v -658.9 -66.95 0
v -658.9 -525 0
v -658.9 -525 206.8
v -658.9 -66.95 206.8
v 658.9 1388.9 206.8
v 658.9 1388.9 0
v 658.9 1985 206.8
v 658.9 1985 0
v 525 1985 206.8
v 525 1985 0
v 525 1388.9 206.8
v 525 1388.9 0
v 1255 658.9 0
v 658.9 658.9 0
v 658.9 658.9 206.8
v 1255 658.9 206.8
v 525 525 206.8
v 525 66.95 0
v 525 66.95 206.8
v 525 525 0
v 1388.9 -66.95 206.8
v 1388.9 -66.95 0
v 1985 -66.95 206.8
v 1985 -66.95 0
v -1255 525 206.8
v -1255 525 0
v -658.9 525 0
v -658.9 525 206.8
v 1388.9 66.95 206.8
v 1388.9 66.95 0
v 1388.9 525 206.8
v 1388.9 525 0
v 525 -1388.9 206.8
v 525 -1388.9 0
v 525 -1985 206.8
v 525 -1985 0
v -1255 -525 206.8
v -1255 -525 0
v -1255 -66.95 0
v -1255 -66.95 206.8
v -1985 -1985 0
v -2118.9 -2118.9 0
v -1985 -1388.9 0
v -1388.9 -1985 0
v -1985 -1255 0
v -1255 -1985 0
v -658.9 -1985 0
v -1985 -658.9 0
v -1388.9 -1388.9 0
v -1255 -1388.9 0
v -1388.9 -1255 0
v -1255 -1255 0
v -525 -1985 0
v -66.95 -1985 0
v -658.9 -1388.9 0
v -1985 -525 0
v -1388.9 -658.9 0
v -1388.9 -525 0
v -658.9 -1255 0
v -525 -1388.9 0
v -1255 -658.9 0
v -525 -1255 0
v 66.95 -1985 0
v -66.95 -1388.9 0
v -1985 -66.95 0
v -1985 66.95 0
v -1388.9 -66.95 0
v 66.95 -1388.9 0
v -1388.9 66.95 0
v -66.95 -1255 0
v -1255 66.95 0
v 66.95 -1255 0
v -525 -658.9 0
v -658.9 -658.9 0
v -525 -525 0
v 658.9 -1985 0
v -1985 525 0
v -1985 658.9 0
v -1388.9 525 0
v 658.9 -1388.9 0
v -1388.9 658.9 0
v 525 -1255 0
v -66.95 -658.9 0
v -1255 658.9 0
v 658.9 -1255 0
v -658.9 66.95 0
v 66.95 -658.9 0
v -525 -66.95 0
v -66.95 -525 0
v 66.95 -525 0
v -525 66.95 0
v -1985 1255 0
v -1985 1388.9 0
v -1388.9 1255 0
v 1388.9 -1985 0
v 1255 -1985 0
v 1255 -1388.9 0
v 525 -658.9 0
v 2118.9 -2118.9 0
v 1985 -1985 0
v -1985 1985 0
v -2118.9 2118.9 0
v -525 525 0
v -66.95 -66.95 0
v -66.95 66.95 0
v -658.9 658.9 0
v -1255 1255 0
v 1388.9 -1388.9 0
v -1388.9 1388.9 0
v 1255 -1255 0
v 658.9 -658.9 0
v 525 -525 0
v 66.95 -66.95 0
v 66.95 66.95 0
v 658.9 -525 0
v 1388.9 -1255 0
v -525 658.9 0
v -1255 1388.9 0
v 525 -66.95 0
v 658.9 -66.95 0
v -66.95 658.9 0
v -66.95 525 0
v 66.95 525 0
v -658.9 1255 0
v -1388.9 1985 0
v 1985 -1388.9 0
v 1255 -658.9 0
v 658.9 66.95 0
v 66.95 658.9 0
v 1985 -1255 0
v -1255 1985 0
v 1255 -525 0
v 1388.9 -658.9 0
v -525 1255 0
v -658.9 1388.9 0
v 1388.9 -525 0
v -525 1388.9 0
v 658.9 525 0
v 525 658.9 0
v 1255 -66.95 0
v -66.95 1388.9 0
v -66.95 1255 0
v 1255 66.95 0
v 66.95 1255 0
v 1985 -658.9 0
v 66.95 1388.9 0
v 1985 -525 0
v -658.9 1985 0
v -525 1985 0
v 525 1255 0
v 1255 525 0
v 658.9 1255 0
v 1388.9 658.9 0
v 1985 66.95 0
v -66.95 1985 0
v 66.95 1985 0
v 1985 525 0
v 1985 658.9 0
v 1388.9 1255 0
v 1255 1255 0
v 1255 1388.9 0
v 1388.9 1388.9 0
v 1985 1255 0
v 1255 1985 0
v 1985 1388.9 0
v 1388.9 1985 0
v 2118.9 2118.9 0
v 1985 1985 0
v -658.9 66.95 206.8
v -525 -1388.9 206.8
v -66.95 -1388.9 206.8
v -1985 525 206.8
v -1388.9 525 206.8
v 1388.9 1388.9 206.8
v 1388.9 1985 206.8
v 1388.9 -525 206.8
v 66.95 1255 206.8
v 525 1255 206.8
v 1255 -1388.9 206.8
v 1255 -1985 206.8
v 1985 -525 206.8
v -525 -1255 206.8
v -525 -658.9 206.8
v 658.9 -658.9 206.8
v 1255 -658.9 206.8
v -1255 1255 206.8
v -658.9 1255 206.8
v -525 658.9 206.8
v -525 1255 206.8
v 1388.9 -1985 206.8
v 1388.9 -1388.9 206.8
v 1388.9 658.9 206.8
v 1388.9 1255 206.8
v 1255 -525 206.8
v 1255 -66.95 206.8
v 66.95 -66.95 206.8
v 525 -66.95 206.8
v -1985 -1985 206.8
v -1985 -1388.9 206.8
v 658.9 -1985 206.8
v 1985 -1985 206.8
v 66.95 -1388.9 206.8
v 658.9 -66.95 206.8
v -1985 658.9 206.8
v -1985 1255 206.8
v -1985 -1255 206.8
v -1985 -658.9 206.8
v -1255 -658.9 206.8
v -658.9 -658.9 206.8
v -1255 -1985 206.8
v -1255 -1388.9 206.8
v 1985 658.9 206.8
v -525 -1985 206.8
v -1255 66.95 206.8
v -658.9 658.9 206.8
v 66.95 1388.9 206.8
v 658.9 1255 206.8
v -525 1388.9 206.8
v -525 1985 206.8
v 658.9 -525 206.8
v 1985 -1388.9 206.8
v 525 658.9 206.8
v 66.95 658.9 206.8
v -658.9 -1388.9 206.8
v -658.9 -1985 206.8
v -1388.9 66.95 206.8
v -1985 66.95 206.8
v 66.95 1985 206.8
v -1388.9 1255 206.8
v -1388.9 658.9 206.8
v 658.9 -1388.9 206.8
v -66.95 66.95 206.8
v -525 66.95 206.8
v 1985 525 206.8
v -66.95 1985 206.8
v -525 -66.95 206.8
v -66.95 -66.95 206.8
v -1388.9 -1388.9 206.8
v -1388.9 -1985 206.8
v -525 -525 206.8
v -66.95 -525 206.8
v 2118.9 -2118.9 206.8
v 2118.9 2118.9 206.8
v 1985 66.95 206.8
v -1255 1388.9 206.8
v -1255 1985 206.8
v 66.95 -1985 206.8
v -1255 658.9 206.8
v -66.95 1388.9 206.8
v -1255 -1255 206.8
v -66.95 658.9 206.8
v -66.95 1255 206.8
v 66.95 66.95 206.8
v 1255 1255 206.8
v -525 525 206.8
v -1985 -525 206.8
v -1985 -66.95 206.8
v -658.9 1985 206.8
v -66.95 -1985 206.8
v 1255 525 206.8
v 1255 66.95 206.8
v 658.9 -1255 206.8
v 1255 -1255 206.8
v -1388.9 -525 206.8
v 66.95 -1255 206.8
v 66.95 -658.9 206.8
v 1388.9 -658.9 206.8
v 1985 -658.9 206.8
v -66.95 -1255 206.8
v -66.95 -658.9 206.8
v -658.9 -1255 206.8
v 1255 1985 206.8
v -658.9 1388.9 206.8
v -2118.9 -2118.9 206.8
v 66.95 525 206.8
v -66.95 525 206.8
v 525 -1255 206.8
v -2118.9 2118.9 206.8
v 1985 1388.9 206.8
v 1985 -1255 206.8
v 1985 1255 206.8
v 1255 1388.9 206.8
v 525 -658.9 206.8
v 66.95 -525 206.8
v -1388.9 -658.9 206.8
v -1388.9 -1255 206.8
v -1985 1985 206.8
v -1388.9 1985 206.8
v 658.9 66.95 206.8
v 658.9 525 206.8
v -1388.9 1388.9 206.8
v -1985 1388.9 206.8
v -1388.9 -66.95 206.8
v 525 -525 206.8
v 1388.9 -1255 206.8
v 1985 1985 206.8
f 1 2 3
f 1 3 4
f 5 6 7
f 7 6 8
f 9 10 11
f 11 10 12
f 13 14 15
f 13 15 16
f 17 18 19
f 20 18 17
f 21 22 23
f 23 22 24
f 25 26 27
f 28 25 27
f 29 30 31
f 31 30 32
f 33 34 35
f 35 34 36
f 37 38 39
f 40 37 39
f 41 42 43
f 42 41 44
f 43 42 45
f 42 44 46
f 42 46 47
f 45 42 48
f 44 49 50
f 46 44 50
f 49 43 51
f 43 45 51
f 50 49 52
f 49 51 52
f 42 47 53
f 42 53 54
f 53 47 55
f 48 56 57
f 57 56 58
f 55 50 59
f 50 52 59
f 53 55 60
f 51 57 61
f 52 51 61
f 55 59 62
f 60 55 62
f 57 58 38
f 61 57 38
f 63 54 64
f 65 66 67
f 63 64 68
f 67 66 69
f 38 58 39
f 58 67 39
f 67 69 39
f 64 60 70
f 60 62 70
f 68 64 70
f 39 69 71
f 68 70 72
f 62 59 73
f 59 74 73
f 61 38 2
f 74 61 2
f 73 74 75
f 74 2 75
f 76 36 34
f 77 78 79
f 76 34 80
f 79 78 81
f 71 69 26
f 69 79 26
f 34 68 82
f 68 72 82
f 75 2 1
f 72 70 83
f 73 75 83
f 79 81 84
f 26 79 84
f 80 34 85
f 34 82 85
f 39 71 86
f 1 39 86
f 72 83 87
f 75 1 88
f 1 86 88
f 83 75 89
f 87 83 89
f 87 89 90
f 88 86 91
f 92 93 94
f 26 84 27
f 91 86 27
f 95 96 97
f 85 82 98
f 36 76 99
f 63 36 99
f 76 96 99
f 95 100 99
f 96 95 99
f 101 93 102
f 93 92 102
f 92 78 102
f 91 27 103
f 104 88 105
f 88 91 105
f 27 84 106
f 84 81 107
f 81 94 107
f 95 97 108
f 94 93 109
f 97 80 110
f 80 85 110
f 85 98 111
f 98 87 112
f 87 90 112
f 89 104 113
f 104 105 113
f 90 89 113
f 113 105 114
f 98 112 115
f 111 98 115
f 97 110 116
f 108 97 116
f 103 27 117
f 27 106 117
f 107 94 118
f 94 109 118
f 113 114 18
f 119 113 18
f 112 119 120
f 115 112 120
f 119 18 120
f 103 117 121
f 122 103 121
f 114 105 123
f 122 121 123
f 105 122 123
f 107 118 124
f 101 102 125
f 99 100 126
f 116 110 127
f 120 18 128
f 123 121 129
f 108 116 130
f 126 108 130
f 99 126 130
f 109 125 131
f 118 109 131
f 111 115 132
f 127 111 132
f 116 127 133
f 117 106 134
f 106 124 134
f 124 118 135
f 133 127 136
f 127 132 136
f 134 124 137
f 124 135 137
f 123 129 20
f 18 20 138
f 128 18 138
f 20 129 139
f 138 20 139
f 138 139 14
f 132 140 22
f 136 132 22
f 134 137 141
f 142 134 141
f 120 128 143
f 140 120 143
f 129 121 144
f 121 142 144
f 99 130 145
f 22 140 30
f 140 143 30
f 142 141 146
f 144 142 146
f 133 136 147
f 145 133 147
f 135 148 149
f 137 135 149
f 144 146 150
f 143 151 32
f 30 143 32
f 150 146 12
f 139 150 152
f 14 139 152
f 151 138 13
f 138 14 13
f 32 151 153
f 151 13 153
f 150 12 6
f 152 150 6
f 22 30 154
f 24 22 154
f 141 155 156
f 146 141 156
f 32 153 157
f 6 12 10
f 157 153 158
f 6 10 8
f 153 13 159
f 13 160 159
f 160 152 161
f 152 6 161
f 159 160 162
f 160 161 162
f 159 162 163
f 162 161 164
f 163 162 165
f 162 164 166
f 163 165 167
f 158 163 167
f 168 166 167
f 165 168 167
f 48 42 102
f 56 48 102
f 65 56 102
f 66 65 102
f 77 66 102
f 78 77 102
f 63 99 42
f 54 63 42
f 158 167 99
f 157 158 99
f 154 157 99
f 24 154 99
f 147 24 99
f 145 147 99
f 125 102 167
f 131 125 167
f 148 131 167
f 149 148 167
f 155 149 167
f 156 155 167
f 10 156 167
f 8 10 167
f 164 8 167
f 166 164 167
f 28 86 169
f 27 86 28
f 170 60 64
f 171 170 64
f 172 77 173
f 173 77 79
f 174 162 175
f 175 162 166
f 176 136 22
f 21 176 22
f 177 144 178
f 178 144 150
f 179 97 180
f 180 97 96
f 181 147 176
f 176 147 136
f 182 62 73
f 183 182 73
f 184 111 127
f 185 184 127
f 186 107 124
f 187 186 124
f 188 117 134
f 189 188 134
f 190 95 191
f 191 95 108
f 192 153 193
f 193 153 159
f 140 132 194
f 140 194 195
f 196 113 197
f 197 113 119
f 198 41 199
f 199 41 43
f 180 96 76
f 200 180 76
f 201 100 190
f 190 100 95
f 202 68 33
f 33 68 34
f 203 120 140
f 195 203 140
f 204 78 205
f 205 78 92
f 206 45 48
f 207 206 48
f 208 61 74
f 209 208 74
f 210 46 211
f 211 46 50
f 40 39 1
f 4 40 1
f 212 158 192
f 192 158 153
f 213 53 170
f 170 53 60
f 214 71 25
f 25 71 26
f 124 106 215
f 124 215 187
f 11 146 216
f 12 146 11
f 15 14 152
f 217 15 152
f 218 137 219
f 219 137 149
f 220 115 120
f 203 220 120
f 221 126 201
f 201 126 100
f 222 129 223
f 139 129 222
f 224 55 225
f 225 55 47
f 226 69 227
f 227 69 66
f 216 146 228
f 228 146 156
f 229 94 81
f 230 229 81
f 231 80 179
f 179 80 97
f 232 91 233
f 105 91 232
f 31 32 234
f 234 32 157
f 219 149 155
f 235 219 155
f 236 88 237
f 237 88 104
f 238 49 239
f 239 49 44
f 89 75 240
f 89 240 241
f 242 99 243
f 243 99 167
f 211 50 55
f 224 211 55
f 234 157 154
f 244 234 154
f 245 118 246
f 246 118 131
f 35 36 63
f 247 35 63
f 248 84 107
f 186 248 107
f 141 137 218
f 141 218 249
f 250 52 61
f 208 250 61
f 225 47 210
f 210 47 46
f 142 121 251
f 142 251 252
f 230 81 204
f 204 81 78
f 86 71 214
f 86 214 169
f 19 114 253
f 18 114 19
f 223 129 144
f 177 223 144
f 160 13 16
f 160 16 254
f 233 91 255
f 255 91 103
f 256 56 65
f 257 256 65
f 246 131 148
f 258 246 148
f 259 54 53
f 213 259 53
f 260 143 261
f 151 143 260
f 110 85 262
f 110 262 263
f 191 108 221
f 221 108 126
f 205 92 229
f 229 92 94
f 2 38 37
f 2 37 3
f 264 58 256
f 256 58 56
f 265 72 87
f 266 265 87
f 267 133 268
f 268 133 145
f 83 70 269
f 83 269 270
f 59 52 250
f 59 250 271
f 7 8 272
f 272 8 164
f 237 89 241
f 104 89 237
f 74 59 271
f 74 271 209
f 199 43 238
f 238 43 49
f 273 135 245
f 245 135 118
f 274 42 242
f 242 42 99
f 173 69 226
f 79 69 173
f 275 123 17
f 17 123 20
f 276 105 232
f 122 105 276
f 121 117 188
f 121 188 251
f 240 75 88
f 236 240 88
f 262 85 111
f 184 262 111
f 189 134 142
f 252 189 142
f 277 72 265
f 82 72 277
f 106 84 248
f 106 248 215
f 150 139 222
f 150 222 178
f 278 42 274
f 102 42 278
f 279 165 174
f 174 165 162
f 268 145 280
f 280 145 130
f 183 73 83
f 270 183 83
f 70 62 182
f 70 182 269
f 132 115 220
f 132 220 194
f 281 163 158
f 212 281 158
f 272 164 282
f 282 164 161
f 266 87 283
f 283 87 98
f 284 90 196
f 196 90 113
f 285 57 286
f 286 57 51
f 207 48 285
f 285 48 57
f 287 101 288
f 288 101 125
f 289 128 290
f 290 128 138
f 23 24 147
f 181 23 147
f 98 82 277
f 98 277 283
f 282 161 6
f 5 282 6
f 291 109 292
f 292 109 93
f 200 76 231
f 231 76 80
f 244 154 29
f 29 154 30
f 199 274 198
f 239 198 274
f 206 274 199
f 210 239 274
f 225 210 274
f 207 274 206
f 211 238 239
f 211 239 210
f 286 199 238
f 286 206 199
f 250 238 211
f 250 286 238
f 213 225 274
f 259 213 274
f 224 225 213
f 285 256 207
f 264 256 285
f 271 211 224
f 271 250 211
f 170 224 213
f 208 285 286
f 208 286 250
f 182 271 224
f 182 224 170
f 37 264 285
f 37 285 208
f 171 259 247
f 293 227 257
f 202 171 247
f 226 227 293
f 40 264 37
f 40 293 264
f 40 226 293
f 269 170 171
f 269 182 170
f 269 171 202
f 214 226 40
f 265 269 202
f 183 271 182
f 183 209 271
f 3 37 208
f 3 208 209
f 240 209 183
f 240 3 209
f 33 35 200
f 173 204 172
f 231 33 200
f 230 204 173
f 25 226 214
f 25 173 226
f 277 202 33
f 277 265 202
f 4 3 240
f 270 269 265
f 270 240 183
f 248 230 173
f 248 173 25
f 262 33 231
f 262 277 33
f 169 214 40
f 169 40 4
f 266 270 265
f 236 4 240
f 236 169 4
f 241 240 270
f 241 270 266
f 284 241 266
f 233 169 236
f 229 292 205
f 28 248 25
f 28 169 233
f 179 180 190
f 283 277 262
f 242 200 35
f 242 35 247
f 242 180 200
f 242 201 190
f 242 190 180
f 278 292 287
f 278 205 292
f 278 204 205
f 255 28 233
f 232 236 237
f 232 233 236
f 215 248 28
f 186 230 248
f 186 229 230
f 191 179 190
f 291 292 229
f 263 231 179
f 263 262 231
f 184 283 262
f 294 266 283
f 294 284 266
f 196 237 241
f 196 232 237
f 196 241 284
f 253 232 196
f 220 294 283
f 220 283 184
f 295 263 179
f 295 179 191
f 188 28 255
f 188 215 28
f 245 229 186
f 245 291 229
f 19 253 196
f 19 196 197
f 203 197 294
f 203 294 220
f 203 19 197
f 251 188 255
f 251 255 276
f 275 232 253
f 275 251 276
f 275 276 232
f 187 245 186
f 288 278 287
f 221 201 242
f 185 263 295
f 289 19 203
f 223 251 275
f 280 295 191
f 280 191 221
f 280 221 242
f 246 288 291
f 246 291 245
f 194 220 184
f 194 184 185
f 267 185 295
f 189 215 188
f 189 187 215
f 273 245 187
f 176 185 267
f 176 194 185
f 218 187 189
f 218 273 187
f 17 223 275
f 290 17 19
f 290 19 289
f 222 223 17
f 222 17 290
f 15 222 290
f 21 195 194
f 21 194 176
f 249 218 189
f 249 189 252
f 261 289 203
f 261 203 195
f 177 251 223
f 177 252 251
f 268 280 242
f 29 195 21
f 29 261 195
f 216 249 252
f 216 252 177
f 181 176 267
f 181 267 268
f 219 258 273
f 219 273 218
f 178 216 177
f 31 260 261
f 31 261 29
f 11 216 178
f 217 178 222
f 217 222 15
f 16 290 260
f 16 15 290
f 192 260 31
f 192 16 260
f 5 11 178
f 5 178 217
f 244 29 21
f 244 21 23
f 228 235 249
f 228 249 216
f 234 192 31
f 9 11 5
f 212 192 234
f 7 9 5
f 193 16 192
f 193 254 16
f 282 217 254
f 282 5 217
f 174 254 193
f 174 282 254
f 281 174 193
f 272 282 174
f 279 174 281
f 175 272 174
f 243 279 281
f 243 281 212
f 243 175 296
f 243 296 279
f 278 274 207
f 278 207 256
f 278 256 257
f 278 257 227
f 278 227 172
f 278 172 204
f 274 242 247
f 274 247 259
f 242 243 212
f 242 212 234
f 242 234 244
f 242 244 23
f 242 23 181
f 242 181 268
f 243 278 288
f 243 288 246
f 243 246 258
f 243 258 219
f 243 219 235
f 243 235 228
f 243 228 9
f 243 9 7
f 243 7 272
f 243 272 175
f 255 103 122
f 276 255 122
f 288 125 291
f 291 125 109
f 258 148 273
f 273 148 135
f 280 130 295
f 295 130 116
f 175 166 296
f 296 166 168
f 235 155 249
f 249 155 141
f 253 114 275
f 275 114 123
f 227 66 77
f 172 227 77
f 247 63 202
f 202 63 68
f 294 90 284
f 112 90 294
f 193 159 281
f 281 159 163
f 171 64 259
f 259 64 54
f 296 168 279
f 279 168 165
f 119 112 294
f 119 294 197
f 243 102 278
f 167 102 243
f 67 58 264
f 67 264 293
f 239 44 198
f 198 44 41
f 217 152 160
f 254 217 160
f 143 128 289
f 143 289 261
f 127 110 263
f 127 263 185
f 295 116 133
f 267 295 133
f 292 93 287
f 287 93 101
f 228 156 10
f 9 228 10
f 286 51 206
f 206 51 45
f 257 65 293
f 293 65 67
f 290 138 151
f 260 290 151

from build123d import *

# Parameters (mm, degrees)
F0_W     = 4237.8
F0_H     = 4237.8
F0_W_2   = 596.1
F0_H_2   = 133.9
F0_W_3   = 133.9
F0_H_3   = 596.1
F0_H_4   = 458.05
F0_W_4   = 458.05
F1_DEPTH = 206.8


with BuildPart() as f1:
    # F0 (on Top) → F1 (new body)
    with BuildSketch(Plane.XY):
        Rectangle(F0_W, F0_H)
        Polygon((1985, 66.95), (1985, 0), (1985, -66.95), (1985, -525), (1985, -658.9), (1985, -1255), (1985, -1388.9), (1985, -1985), (1388.9, -1985), (1255, -1985), (658.9, -1985), (525, -1985), (66.95, -1985), (4.19e-08, -1985), (-66.95, -1985), (-525, -1985), (-658.9, -1985), (-1255, -1985), (-1388.9, -1985), (-1985, -1985), (-1985, -1388.9), (-1985, -1255), (-1985, -658.9), (-1985, -525), (-1985, -66.95), (-1985, 1.1618e-06), (-1985, 66.95), (-1985, 525), (-1985, 658.9), (-1985, 1255), (-1985, 1388.9), (-1985, 1985), (-1388.9, 1985), (-1255, 1985), (-658.9, 1985), (-525, 1985), (-66.95, 1985), (0, 1985), (66.95, 1985), (525, 1985), (658.9, 1985), (1255, 1985), (1388.9, 1985), (1985, 1985), (1985, 1388.9), (1985, 1255), (1985, 658.9), (1985, 525), align=None, mode=Mode.SUBTRACT)
        with Locations((-956.95, 1321.95)):
            Rectangle(F0_W_2, F0_H_2)
        with Locations((-1321.95, 956.95)):
            Rectangle(F0_W_3, F0_H_3)
        with Locations((-956.95, -591.95)):
            Rectangle(F0_W_2, F0_H_2)
        with Locations((-1321.95, -956.95)):
            Rectangle(F0_W_3, F0_H_3)
        with Locations((-956.95, 0)):
            Rectangle(F0_W_2, F0_H_2)
        with Locations((-591.95, -956.95)):
            Rectangle(F0_W_3, F0_H_3)
        with Locations((-956.95, 591.95)):
            Rectangle(F0_W_2, F0_H_2)
        with Locations((-956.95, -1321.95)):
            Rectangle(F0_W_2, F0_H_2)
        with Locations((0, -956.95)):
            Rectangle(F0_W_3, F0_H_3)
        with Locations((-591.95, 956.95)):
            Rectangle(F0_W_3, F0_H_3)
        with Locations((0, 956.95)):
            Rectangle(F0_W_3, F0_H_3)
        with Locations((591.95, 956.95)):
            Rectangle(F0_W_3, F0_H_3)
        with Locations((1321.95, 956.95)):
            Rectangle(F0_W_3, F0_H_3)
        with Locations((956.95, 1321.95)):
            Rectangle(F0_W_2, F0_H_2)
        with Locations((956.95, 591.95)):
            Rectangle(F0_W_2, F0_H_2)
        with Locations((956.95, 0)):
            Rectangle(F0_W_2, F0_H_2)
        with Locations((956.95, -591.95)):
            Rectangle(F0_W_2, F0_H_2)
        with Locations((591.95, -956.95)):
            Rectangle(F0_W_3, F0_H_3)
        with Locations((1321.95, -956.95)):
            Rectangle(F0_W_3, F0_H_3)
        with Locations((956.95, -1321.95)):
            Rectangle(F0_W_2, F0_H_2)
        with BuildLine():
            Line((-1388.9, -66.95), (-1388.9, 66.95))
            Line((-1388.9, 66.95), (-1983.8706352734, 66.95))
            ThreePointArc((-1983.8706352734, 66.95), (-1984.717638726, 33.4797629929), (-1985, 1.1618e-06))
            ThreePointArc((-1985, 1.1618e-06), (-1984.7176387456, -33.4797618313), (-1983.8706352734, -66.95))
            Line((-1983.8706352734, -66.95), (-1388.9, -66.95))
        make_face()
        with BuildLine():
            Line((66.95, 1388.9), (66.95, 1983.8706352734))
            ThreePointArc((66.95, 1983.8706352734), (33.4797624121, 1984.7176387358), (0, 1985))
            ThreePointArc((0, 1985), (-33.4797624121, 1984.7176387358), (-66.95, 1983.8706352734))
            Line((-66.95, 1983.8706352734), (-66.95, 1388.9))
            Line((-66.95, 1388.9), (66.95, 1388.9))
        make_face()
        with BuildLine():
            ThreePointArc((1983.8706352734, -66.95), (1984.7176387358, -33.4797624121), (1985, 0))
            ThreePointArc((1985, 0), (1984.7176387358, 33.4797624121), (1983.8706352734, 66.95))
            Line((1983.8706352734, 66.95), (1388.9, 66.95))
            Line((1388.9, 66.95), (1388.9, -66.95))
            Line((1388.9, -66.95), (1983.8706352734, -66.95))
        make_face()
        with BuildLine():
            ThreePointArc((4.19e-08, -1985), (33.479762433, -1984.7176387354), (66.95, -1983.8706352734))
            Line((66.95, -1983.8706352734), (66.95, -1388.9))
            Line((66.95, -1388.9), (-66.95, -1388.9))
            Line((-66.95, -1388.9), (-66.95, -1983.8706352734))
            ThreePointArc((-66.95, -1983.8706352734), (-33.4797623912, -1984.7176387361), (4.19e-08, -1985))
        make_face()
        with BuildLine():
            Line((-658.9, 1388.9), (-525, 1388.9))
            Line((-525, 1388.9), (-525, 1914.3144987175))
            ThreePointArc((-525, 1914.3144987175), (-592.3199503859, 1894.5664613243), (-658.9, 1872.4518124641))
            Line((-658.9, 1872.4518124641), (-658.9, 1388.9))
        make_face()
        with BuildLine():
            Line((-1914.3144987175, 525), (-1388.9, 525))
            Line((-1388.9, 525), (-1388.9, 658.9))
            Line((-1388.9, 658.9), (-1872.4518124641, 658.9))
            ThreePointArc((-1872.4518124641, 658.9), (-1894.5664613243, 592.3199503858), (-1914.3144987175, 525))
        make_face()
        with BuildLine():
            Line((-1388.9, -658.9), (-1388.9, -525))
            Line((-1388.9, -525), (-1914.3144987175, -525))
            ThreePointArc((-1914.3144987175, -525), (-1894.5664613243, -592.3199503858), (-1872.4518124641, -658.9))
            Line((-1872.4518124641, -658.9), (-1388.9, -658.9))
        make_face()
        with BuildLine():
            Line((-525, -1914.3144987175), (-525, -1388.9))
            Line((-525, -1388.9), (-658.9, -1388.9))
            Line((-658.9, -1388.9), (-658.9, -1872.4518124641))
            ThreePointArc((-658.9, -1872.4518124641), (-592.3199503859, -1894.5664613243), (-525, -1914.3144987175))
        make_face()
        with BuildLine():
            Line((658.9, 1388.9), (658.9, 1872.4518124641))
            ThreePointArc((658.9, 1872.4518124641), (592.3199503858, 1894.5664613243), (525, 1914.3144987175))
            Line((525, 1914.3144987175), (525, 1388.9))
            Line((525, 1388.9), (658.9, 1388.9))
        make_face()
        with BuildLine():
            Line((1388.9, 525), (1914.3144987175, 525))
            ThreePointArc((1914.3144987175, 525), (1894.5664613243, 592.3199503859), (1872.4518124641, 658.9))
            Line((1872.451812464, 658.9), (1388.9, 658.9))
            Line((1388.9, 658.9), (1388.9, 525))
        make_face()
        with BuildLine():
            ThreePointArc((1872.4518124641, -658.9), (1894.5664613243, -592.3199503859), (1914.3144987175, -525))
            Line((1914.3144987175, -525), (1388.9, -525))
            Line((1388.9, -525), (1388.9, -658.9))
            Line((1388.9, -658.9), (1872.451812464, -658.9))
        make_face()
        with BuildLine():
            ThreePointArc((525, -1914.3144987175), (592.3199503858, -1894.5664613243), (658.9, -1872.4518124641))
            Line((658.9, -1872.4518124641), (658.9, -1388.9))
            Line((658.9, -1388.9), (525, -1388.9))
            Line((525, -1388.9), (525, -1914.3144987175))
        make_face()
        with BuildLine():
            ThreePointArc((-1388.9, 1418.1614118287), (-1323.3054721901, 1479.5565644042), (-1255, 1537.9206741571))
            Line((-1255, 1537.9206741571), (-1255, 1985))
            Line((-1255, 1985), (-1388.9, 1985))
            Line((-1388.9, 1985), (-1388.9, 1418.1614118287))
        make_face()
        with BuildLine():
            Line((-1985, 1255), (-1537.9206741571, 1255))
            ThreePointArc((-1537.9206741571, 1255), (-1479.5565644042, 1323.3054721902), (-1418.1614118287, 1388.9))
            Line((-1418.1614118287, 1388.9), (-1985, 1388.9))
            Line((-1985, 1388.9), (-1985, 1255))
        make_face()
        with BuildLine():
            ThreePointArc((-1418.1614118287, -1388.9), (-1479.5565644042, -1323.3054721902), (-1537.9206741571, -1255))
            Line((-1537.9206741571, -1255), (-1985, -1255))
            Line((-1985, -1255), (-1985, -1388.9))
            Line((-1985, -1388.9), (-1418.1614118287, -1388.9))
        make_face()
        with BuildLine():
            Line((-1255, -1985), (-1255, -1537.9206741571))
            ThreePointArc((-1255, -1537.9206741571), (-1323.3054721901, -1479.5565644042), (-1388.9, -1418.1614118287))
            Line((-1388.9, -1418.1614118287), (-1388.9, -1985))
            Line((-1388.9, -1985), (-1255, -1985))
        make_face()
        with BuildLine():
            ThreePointArc((1255, 1537.9206741572), (1323.3054721902, 1479.5565644042), (1388.9, 1418.1614118287))
            Line((1388.9, 1418.1614118287), (1388.9, 1985))
            Line((1388.9, 1985), (1255, 1985))
            Line((1255, 1985), (1255, 1537.9206741572))
        make_face()
        with BuildLine():
            ThreePointArc((1418.1614118287, 1388.9000000001), (1479.5565644042, 1323.3054721902), (1537.9206741572, 1255))
            Line((1537.9206741571, 1255), (1985, 1255))
            Line((1985, 1255), (1985, 1388.9))
            Line((1985, 1388.9), (1418.1614118286, 1388.9))
        make_face()
        with BuildLine():
            Line((1985, -1255), (1537.9206741571, -1255))
            ThreePointArc((1537.9206741572, -1255), (1479.5565644042, -1323.3054721902), (1418.1614118287, -1388.9000000001))
            Line((1418.1614118286, -1388.9), (1985, -1388.9))
            Line((1985, -1388.9), (1985, -1255))
        make_face()
        with BuildLine():
            Line((1388.9, -1985), (1388.9, -1418.1614118287))
            ThreePointArc((1388.9, -1418.1614118287), (1323.3054721901, -1479.5565644042), (1255, -1537.9206741572))
            Line((1255, -1537.9206741572), (1255, -1985))
            Line((1255, -1985), (1388.9, -1985))
        make_face()
        with Locations((-1321.95, 295.975)):
            Rectangle(F0_W_3, F0_H_4)
        with Locations((-1321.95, -295.975)):
            Rectangle(F0_W_3, F0_H_4)
        with Locations((-591.95, -295.975)):
            Rectangle(F0_W_3, F0_H_4)
        with Locations((-295.975, -591.95)):
            Rectangle(F0_W_4, F0_H_2)
        with Locations((-295.975, 0)):
            Rectangle(F0_W_4, F0_H_2)
        with Locations((-591.95, 295.975)):
            Rectangle(F0_W_3, F0_H_4)
        with Locations((-295.975, 591.95)):
            Rectangle(F0_W_4, F0_H_2)
        with Locations((-295.975, -1321.95)):
            Rectangle(F0_W_4, F0_H_2)
        with Locations((0, -295.975)):
            Rectangle(F0_W_3, F0_H_4)
        with Locations((0, 295.975)):
            Rectangle(F0_W_3, F0_H_4)
        with Locations((-295.975, 1321.95)):
            Rectangle(F0_W_4, F0_H_2)
        with Locations((295.975, 1321.95)):
            Rectangle(F0_W_4, F0_H_2)
        with Locations((295.975, 591.95)):
            Rectangle(F0_W_4, F0_H_2)
        with Locations((1321.95, 295.975)):
            Rectangle(F0_W_3, F0_H_4)
        with Locations((591.95, 295.975)):
            Rectangle(F0_W_3, F0_H_4)
        with Locations((295.975, 0)):
            Rectangle(F0_W_4, F0_H_2)
        with Locations((295.975, -591.95)):
            Rectangle(F0_W_4, F0_H_2)
        with Locations((591.95, -295.975)):
            Rectangle(F0_W_3, F0_H_4)
        with Locations((1321.95, -295.975)):
            Rectangle(F0_W_3, F0_H_4)
        with Locations((295.975, -1321.95)):
            Rectangle(F0_W_4, F0_H_2)
        with Locations((-1321.95, 1321.95)):
            Rectangle(F0_W_3, F0_H_2)
        with Locations((-1321.95, 591.95)):
            Rectangle(F0_W_3, F0_H_2)
        with Locations((-1321.95, 0)):
            Rectangle(F0_W_3, F0_H_2)
        with Locations((-1321.95, -591.95)):
            Rectangle(F0_W_3, F0_H_2)
        with Locations((-591.95, 0)):
            Rectangle(F0_W_3, F0_H_2)
        with Locations((-591.95, -591.95)):
            Rectangle(F0_W_3, F0_H_2)
        with Locations((-591.95, 591.95)):
            Rectangle(F0_W_3, F0_H_2)
        with Locations((-1321.95, -1321.95)):
            Rectangle(F0_W_3, F0_H_2)
        with Locations((-591.95, -1321.95)):
            Rectangle(F0_W_3, F0_H_2)
        with Locations((0, -1321.95)):
            Rectangle(F0_W_3, F0_H_2)
        with Locations((0, -591.95)):
            Rectangle(F0_W_3, F0_H_2)
        Rectangle(F0_W_3, F0_H_2)
        with Locations((0, 591.95)):
            Rectangle(F0_W_3, F0_H_2)
        with Locations((-591.95, 1321.95)):
            Rectangle(F0_W_3, F0_H_2)
        with Locations((0, 1321.95)):
            Rectangle(F0_W_3, F0_H_2)
        with Locations((591.95, 1321.95)):
            Rectangle(F0_W_3, F0_H_2)
        with Locations((591.95, 591.95)):
            Rectangle(F0_W_3, F0_H_2)
        with Locations((1321.95, 1321.95)):
            Rectangle(F0_W_3, F0_H_2)
        with Locations((1321.95, 591.95)):
            Rectangle(F0_W_3, F0_H_2)
        with Locations((591.95, 0)):
            Rectangle(F0_W_3, F0_H_2)
        with Locations((1321.95, 0)):
            Rectangle(F0_W_3, F0_H_2)
        with Locations((591.95, -591.95)):
            Rectangle(F0_W_3, F0_H_2)
        with Locations((1321.95, -591.95)):
            Rectangle(F0_W_3, F0_H_2)
        with Locations((1321.95, -1321.95)):
            Rectangle(F0_W_3, F0_H_2)
        with Locations((591.95, -1321.95)):
            Rectangle(F0_W_3, F0_H_2)
        with BuildLine():
            Line((-1537.9206741571, 1255), (-1388.9, 1255))
            Line((-1388.9, 1255), (-1388.9, 1388.9))
            Line((-1388.9, 1388.9), (-1418.1614118287, 1388.9))
            ThreePointArc((-1418.1614118287, 1388.9), (-1479.5565644042, 1323.3054721902), (-1537.9206741571, 1255))
        make_face()
        with BuildLine():
            Line((-1388.9, 1388.9), (-1255, 1388.9))
            Line((-1255, 1388.9), (-1255, 1537.9206741571))
            ThreePointArc((-1255, 1537.9206741571), (-1323.3054721901, 1479.5565644042), (-1388.9, 1418.1614118287))
            Line((-1388.9, 1418.1614118287), (-1388.9, 1388.9))
        make_face()
        with BuildLine():
            Line((-1388.9, -1388.9), (-1388.9, -1255))
            Line((-1388.9, -1255), (-1537.9206741571, -1255))
            ThreePointArc((-1537.9206741571, -1255), (-1479.5565644042, -1323.3054721902), (-1418.1614118287, -1388.9))
            Line((-1418.1614118287, -1388.9), (-1388.9, -1388.9))
        make_face()
        with BuildLine():
            Line((-1255, -1537.9206741571), (-1255, -1388.9))
            Line((-1255, -1388.9), (-1388.9, -1388.9))
            Line((-1388.9, -1388.9), (-1388.9, -1418.1614118287))
            ThreePointArc((-1388.9, -1418.1614118287), (-1323.3054721901, -1479.5565644042), (-1255, -1537.9206741571))
        make_face()
        with BuildLine():
            Line((1388.9, 1388.9), (1388.9, 1418.1614118287))
            ThreePointArc((1388.9, 1418.1614118287), (1323.3054721902, 1479.5565644042), (1255, 1537.9206741572))
            Line((1255, 1537.9206741572), (1255, 1388.9))
            Line((1255, 1388.9), (1388.9, 1388.9))
        make_face()
        with BuildLine():
            Line((1388.9, 1255), (1537.9206741571, 1255))
            ThreePointArc((1537.9206741572, 1255), (1479.5565644042, 1323.3054721902), (1418.1614118287, 1388.9000000001))
            Line((1418.1614118286, 1388.9), (1388.9, 1388.9))
            Line((1388.9, 1388.9), (1388.9, 1255))
        make_face()
        with BuildLine():
            ThreePointArc((1418.1614118287, -1388.9000000001), (1479.5565644042, -1323.3054721902), (1537.9206741572, -1255))
            Line((1537.9206741571, -1255), (1388.9, -1255))
            Line((1388.9, -1255), (1388.9, -1388.9))
            Line((1388.9, -1388.9), (1418.1614118286, -1388.9))
        make_face()
        with BuildLine():
            ThreePointArc((1255, -1537.9206741572), (1323.3054721901, -1479.5565644042), (1388.9, -1418.1614118287))
            Line((1388.9, -1418.1614118287), (1388.9, -1388.9))
            Line((1388.9, -1388.9), (1255, -1388.9))
            Line((1255, -1388.9), (1255, -1537.9206741572))
        make_face()
        with BuildLine():
            ThreePointArc((-658.9, 1872.4518124641), (-592.3199503859, 1894.5664613243), (-525, 1914.3144987175))
            Line((-525, 1914.3144987175), (-525, 1985))
            Line((-525, 1985), (-658.9, 1985))
            Line((-658.9, 1985), (-658.9, 1872.4518124641))
        make_face()
        with BuildLine():
            Line((-1985, 525), (-1914.3144987175, 525))
            ThreePointArc((-1914.3144987175, 525), (-1894.5664613243, 592.3199503858), (-1872.4518124641, 658.9))
            Line((-1872.4518124641, 658.9), (-1985, 658.9))
            Line((-1985, 658.9), (-1985, 525))
        make_face()
        with BuildLine():
            ThreePointArc((-1872.4518124641, -658.9), (-1894.5664613243, -592.3199503858), (-1914.3144987175, -525))
            Line((-1914.3144987175, -525), (-1985, -525))
            Line((-1985, -525), (-1985, -658.9))
            Line((-1985, -658.9), (-1872.4518124641, -658.9))
        make_face()
        with BuildLine():
            ThreePointArc((525, 1914.3144987175), (592.3199503858, 1894.5664613243), (658.9, 1872.4518124641))
            Line((658.9, 1872.4518124641), (658.9, 1985))
            Line((658.9, 1985), (525, 1985))
            Line((525, 1985), (525, 1914.3144987175))
        make_face()
        with BuildLine():
            ThreePointArc((1872.4518124641, 658.9), (1894.5664613243, 592.3199503859), (1914.3144987175, 525))
            Line((1914.3144987175, 525), (1985, 525))
            Line((1985, 525), (1985, 658.9))
            Line((1985, 658.9), (1872.451812464, 658.9))
        make_face()
        with BuildLine():
            Line((1985, -525), (1914.3144987175, -525))
            ThreePointArc((1914.3144987175, -525), (1894.5664613243, -592.3199503859), (1872.4518124641, -658.9))
            Line((1872.451812464, -658.9), (1985, -658.9))
            Line((1985, -658.9), (1985, -525))
        make_face()
        with BuildLine():
            Line((-525, -1985), (-525, -1914.3144987175))
            ThreePointArc((-525, -1914.3144987175), (-592.3199503859, -1894.5664613243), (-658.9, -1872.4518124641))
            Line((-658.9, -1872.4518124641), (-658.9, -1985))
            Line((-658.9, -1985), (-525, -1985))
        make_face()
        with BuildLine():
            Line((658.9, -1985), (658.9, -1872.4518124641))
            ThreePointArc((658.9, -1872.4518124641), (592.3199503858, -1894.5664613243), (525, -1914.3144987175))
            Line((525, -1914.3144987175), (525, -1985))
            Line((525, -1985), (658.9, -1985))
        make_face()
        with BuildLine():
            Line((-1985, -66.95), (-1983.8706352734, -66.95))
            ThreePointArc((-1983.8706352734, -66.95), (-1984.7176387456, -33.4797618313), (-1985, 1.1618e-06))
            Line((-1985, 1.1618e-06), (-1985, -66.95))
        make_face()
        with BuildLine():
            ThreePointArc((-1985, 1.1618e-06), (-1984.717638726, 33.4797629929), (-1983.8706352734, 66.95))
            Line((-1983.8706352734, 66.95), (-1985, 66.95))
            Line((-1985, 66.95), (-1985, 1.1618e-06))
        make_face()
        with BuildLine():
            ThreePointArc((-66.95, 1983.8706352734), (-33.4797624121, 1984.7176387358), (0, 1985))
            Line((0, 1985), (-66.95, 1985))
            Line((-66.95, 1985), (-66.95, 1983.8706352734))
        make_face()
        with BuildLine():
            ThreePointArc((0, 1985), (33.4797624121, 1984.7176387358), (66.95, 1983.8706352734))
            Line((66.95, 1983.8706352734), (66.95, 1985))
            Line((66.95, 1985), (0, 1985))
        make_face()
        with BuildLine():
            ThreePointArc((1983.8706352734, 66.95), (1984.7176387358, 33.4797624121), (1985, 0))
            Line((1985, 0), (1985, 66.95))
            Line((1985, 66.95), (1983.8706352734, 66.95))
        make_face()
        with BuildLine():
            Line((1985, -66.95), (1985, 0))
            ThreePointArc((1985, 0), (1984.7176387358, -33.4797624121), (1983.8706352734, -66.95))
            Line((1983.8706352734, -66.95), (1985, -66.95))
        make_face()
        with BuildLine():
            Line((66.95, -1985), (66.95, -1983.8706352734))
            ThreePointArc((66.95, -1983.8706352734), (33.479762433, -1984.7176387354), (4.19e-08, -1985))
            Line((4.19e-08, -1985), (66.95, -1985))
        make_face()
        with BuildLine():
            Line((-66.95, -1985), (4.19e-08, -1985))
            ThreePointArc((4.19e-08, -1985), (-33.4797623912, -1984.7176387361), (-66.95, -1983.8706352734))
            Line((-66.95, -1983.8706352734), (-66.95, -1985))
        make_face()
    extrude(amount=F1_DEPTH)


solid = f1.part
